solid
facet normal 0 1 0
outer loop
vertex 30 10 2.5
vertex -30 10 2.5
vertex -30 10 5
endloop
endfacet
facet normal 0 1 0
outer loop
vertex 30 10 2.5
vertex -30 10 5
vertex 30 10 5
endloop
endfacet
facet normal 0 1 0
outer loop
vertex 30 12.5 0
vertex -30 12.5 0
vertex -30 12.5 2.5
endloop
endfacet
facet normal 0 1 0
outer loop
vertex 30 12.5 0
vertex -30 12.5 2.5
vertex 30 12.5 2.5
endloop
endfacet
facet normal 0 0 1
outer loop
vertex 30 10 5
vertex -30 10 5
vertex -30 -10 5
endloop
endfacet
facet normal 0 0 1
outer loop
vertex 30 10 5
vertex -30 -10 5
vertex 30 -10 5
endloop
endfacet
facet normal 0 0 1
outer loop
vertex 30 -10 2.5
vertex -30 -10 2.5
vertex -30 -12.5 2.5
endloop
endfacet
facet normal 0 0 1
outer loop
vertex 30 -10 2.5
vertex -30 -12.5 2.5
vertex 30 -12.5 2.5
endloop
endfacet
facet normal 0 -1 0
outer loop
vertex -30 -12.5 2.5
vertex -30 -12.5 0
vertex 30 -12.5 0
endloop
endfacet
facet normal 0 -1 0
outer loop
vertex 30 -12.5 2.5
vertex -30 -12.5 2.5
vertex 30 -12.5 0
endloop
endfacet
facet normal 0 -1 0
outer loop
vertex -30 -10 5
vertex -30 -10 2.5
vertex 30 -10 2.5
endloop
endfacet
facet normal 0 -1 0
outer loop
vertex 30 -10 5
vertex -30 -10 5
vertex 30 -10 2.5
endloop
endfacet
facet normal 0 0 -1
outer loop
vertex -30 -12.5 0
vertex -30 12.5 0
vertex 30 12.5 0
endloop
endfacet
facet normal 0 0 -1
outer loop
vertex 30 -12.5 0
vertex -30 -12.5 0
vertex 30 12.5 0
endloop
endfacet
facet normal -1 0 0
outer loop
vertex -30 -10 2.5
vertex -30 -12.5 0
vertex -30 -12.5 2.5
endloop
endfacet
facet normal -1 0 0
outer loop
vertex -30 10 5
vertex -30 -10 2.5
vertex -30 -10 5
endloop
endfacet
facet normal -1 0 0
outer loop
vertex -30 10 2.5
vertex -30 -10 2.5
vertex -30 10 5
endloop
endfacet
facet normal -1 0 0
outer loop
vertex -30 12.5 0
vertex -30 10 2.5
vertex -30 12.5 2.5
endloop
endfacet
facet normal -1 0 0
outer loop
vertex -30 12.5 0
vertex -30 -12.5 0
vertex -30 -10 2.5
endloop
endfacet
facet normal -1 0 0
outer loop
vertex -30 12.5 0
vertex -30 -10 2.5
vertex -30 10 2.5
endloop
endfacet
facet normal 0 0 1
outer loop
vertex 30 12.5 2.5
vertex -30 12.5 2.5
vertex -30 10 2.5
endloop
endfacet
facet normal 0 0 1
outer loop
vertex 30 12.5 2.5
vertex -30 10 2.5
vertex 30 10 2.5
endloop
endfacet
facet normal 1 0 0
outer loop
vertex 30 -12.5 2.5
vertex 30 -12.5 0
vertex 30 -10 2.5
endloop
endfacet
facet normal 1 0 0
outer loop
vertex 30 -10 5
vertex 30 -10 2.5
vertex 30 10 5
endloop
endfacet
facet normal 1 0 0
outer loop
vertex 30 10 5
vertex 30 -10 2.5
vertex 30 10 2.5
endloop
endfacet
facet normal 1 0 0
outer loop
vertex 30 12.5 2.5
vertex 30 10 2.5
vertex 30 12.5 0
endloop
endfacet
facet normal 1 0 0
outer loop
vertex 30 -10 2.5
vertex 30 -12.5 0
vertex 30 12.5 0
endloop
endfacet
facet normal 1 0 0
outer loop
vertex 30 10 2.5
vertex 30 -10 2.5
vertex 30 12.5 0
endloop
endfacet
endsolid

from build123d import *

# Parameters (mm, degrees)
SKETCH_1_W      = 60
SKETCH_1_H      = 25
EXTRUDE_1_DEPTH = 2.5
SKETCH_2_W      = 60
SKETCH_2_H      = 20
EXTRUDE_2_DEPTH = 2.5


with BuildPart() as part:
    # Эскиз1 → Бобышка-Вытянуть1 (new body)
    with BuildSketch(Plane.XY):
        Rectangle(SKETCH_1_W, SKETCH_1_H)
    extrude(amount=EXTRUDE_1_DEPTH)

    # Эскиз2 → Бобышка-Вытянуть2 (add)
    with BuildSketch(Plane.XY.offset(2.5)):
        Rectangle(SKETCH_2_W, SKETCH_2_H)
    extrude(amount=EXTRUDE_2_DEPTH)


solid = part.part
